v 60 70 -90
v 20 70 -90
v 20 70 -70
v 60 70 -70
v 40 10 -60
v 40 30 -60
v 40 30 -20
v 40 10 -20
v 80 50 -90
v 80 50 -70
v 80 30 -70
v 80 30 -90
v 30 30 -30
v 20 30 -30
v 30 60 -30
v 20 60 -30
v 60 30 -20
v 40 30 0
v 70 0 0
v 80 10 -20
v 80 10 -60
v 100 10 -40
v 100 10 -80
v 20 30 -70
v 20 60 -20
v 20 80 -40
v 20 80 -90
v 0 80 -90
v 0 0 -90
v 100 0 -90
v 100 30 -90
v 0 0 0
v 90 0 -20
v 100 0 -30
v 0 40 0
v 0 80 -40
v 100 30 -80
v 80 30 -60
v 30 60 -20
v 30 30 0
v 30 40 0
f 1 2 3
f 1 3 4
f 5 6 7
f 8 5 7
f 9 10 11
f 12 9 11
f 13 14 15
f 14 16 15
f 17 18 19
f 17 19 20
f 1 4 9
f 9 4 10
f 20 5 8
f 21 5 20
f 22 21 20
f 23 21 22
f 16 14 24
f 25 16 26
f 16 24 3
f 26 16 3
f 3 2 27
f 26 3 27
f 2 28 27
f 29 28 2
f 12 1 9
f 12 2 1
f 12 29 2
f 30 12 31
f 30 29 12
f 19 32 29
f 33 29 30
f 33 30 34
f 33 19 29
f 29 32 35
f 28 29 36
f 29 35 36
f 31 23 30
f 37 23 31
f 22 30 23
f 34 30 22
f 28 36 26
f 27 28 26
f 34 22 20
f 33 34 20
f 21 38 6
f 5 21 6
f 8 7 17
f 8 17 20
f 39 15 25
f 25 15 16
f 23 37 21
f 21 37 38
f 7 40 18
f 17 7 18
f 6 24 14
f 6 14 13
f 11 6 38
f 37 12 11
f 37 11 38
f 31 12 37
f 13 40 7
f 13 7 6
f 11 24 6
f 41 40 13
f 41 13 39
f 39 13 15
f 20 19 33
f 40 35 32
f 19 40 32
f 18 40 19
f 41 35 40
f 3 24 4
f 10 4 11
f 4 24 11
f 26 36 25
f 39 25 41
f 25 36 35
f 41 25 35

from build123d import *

# Parameters (mm, degrees)
SKETCH3_W           = 100
SKETCH3_H           = 80
BOSS_EXTRUDE1_DEPTH = 90
CUT_EXTRUDE1_DEPTH  = 90
CUT_EXTRUDE2_DEPTH  = 90
CUT_EXTRUDE3_DEPTH  = 90
SKETCH8_W           = 40
SKETCH8_H           = 60
CUT_EXTRUDE4_DEPTH  = 60
SKETCH9_W           = 30
SKETCH9_H           = 30
CUT_EXTRUDE5_DEPTH  = 60
SKETCH10_W          = 10
SKETCH10_H          = 10
CUT_EXTRUDE6_DEPTH  = 60
SKETCH11_W          = 40
SKETCH11_H          = 60
BOSS_EXTRUDE2_DEPTH = 20
SKETCH12_W          = 40
SKETCH12_H          = 20
BOSS_EXTRUDE3_DEPTH = 40
SKETCH13_W          = 30
SKETCH13_H          = 10
CUT_EXTRUDE7_DEPTH  = 40
CUT_EXTRUDE8_DEPTH  = 40
CUT_EXTRUDE9_DEPTH  = 20
SKETCH17_W          = 20
SKETCH17_H          = 20
CUT_EXTRUDE10_DEPTH = 84
CUT_EXTRUDE12_DEPTH = 20
CUT_EXTRUDE15_DEPTH = 10
CUT_EXTRUDE17_DEPTH = 77
CUT_EXTRUDE19_DEPTH = 77
CUT_EXTRUDE20_DEPTH = 77
CUT_EXTRUDE21_DEPTH = 77


with BuildPart() as part:
    # Sketch3 → Boss-Extrude1 (new body)
    with BuildSketch(Plane.XY):
        with Locations((50, 40)):
            Rectangle(SKETCH3_W, SKETCH3_H)
    extrude(amount=-BOSS_EXTRUDE1_DEPTH)

    # Sketch4 → Cut-Extrude1 (cut)
    with BuildSketch(Plane.XY):
        Polygon((20, 80), (20, 70), (60, 70), (80, 50), (80, 30), (100, 30), (100, 80), align=None)
    extrude(amount=-CUT_EXTRUDE1_DEPTH, mode=Mode.SUBTRACT)

    # Sketch5 → Cut-Extrude2 (cut)
    with BuildSketch(Plane(origin=(0, 0, 0), x_dir=(-1, 0, 0), z_dir=(0, -1, 0))):
        Polygon((-70, 0), (-100, 30), (-100, 0), align=None)
    extrude(amount=-CUT_EXTRUDE2_DEPTH, mode=Mode.SUBTRACT)

    # Sketch7 → Cut-Extrude3 (cut)
    with BuildSketch(Plane.ZY):
        Polygon((-40, 80), (0, 40), (0, 80), align=None)
    extrude(amount=-CUT_EXTRUDE3_DEPTH, mode=Mode.SUBTRACT)

    # Sketch8 → Cut-Extrude4 (cut)
    with BuildSketch(Plane(origin=(0, 70, 0), x_dir=(1, 0, 0), z_dir=(0, 1, 0))):
        with Locations((40, 60)):
            Rectangle(SKETCH8_W, SKETCH8_H)
    extrude(amount=-CUT_EXTRUDE4_DEPTH, mode=Mode.SUBTRACT)

    # Sketch9 → Cut-Extrude5 (cut)
    with BuildSketch(Plane(origin=(0, 0, -30), x_dir=(-1, 0, 0), z_dir=(0, 0, -1))):
        with Locations((-45, 55)):
            Rectangle(SKETCH9_W, SKETCH9_H)
    extrude(amount=-CUT_EXTRUDE5_DEPTH, mode=Mode.SUBTRACT)

    # Sketch10 → Cut-Extrude6 (cut)
    with BuildSketch(Plane(origin=(0, 0, -30), x_dir=(-1, 0, 0), z_dir=(0, 0, -1))):
        with Locations((-25, 65)):
            Rectangle(SKETCH10_W, SKETCH10_H)
    extrude(amount=-CUT_EXTRUDE6_DEPTH, mode=Mode.SUBTRACT)

    # Sketch11 → Boss-Extrude2 (add)
    with BuildSketch(Plane(origin=(0, 10, 0), x_dir=(1, 0, 0), z_dir=(0, 1, 0))):
        with Locations((40, 60)):
            Rectangle(SKETCH11_W, SKETCH11_H)
    extrude(amount=BOSS_EXTRUDE2_DEPTH)

    # Sketch12 → Boss-Extrude3 (add)
    with BuildSketch(Plane(origin=(0, 30, 0), x_dir=(1, 0, 0), z_dir=(0, 1, 0))):
        with Locations((40, 80)):
            Rectangle(SKETCH12_W, SKETCH12_H)
    extrude(amount=BOSS_EXTRUDE3_DEPTH)

    # Sketch13 → Cut-Extrude7 (cut)
    with BuildSketch(Plane(origin=(0, 0, -30), x_dir=(-1, 0, 0), z_dir=(0, 0, -1))):
        with Locations((-45, 35)):
            Rectangle(SKETCH13_W, SKETCH13_H)
    extrude(amount=-CUT_EXTRUDE7_DEPTH, mode=Mode.SUBTRACT)

    # Sketch15 → Cut-Extrude8 (cut)
    with BuildSketch(Plane.ZY.offset(-60)):
        Polygon((-70, 70), (-70, 30), (0, 30), (0, 40), (-30, 70), align=None)
    extrude(amount=-CUT_EXTRUDE8_DEPTH, mode=Mode.SUBTRACT)

    # Sketch16 → Cut-Extrude9 (cut)
    with BuildSketch(Plane(origin=(0, 30, 0), x_dir=(1, 0, 0), z_dir=(0, 1, 0))):
        Polygon((100, 80), (80, 60), (40, 60), (40, 20), (80, 20), (100, 40), align=None)
    extrude(amount=-CUT_EXTRUDE9_DEPTH, mode=Mode.SUBTRACT)

    # Sketch17 → Cut-Extrude10 (cut)
    with BuildSketch(Plane.XY.offset(-50)):
        with Locations((90, 20)):
            Rectangle(SKETCH17_W, SKETCH17_H)
    extrude(amount=CUT_EXTRUDE10_DEPTH, mode=Mode.SUBTRACT)

    # Sketch19 → Cut-Extrude12 (cut)
    with BuildSketch(Plane.XY.offset(-10)):
        Polygon((80, 10), (60, 30), (80, 30), align=None)
    extrude(amount=CUT_EXTRUDE12_DEPTH, mode=Mode.SUBTRACT)

    # Sketch22 → Cut-Extrude15 (cut)
    with BuildSketch(Plane.XY.offset(-10)):
        Polygon((60, 30), (80, 30), (80, 10), align=None)
    extrude(amount=-CUT_EXTRUDE15_DEPTH, mode=Mode.SUBTRACT)

    # Sketch24 → Cut-Extrude17 (cut)
    with BuildSketch(Plane(origin=(23.333333333, 23.333333333, 23.333333333), x_dir=(0.40824829, 0.40824829, -0.816496581), z_dir=(0.577350269, 0.577350269, 0.577350269))):
        Polygon((53.07227776, -21.213203436), (28.577380332, -7.071067812), (28.577380332, -49.497474683), (53.07227776, -49.497474683), align=None)
    extrude(amount=CUT_EXTRUDE17_DEPTH, mode=Mode.SUBTRACT)

    # Sketch26 → Cut-Extrude19 (cut)
    with BuildSketch(Plane(origin=(35, -35, 0), x_dir=(0, 0, 1), z_dir=(-0.707106781, 0.707106781, 0))):
        Polygon((-20, 63.639610307), (-10, 63.639610307), (0, 49.497474683), align=None)
    extrude(amount=-CUT_EXTRUDE19_DEPTH, mode=Mode.SUBTRACT)

    # Sketch27 → Cut-Extrude20 (cut)
    with BuildSketch(Plane(origin=(45, 45, 0), x_dir=(0, 0, 1), z_dir=(-0.707106781, -0.707106781, 0))):
        Polygon((-20, -49.497474683), (-10, -49.497474683), (-20, -63.639610307), align=None)
    extrude(amount=-CUT_EXTRUDE20_DEPTH, mode=Mode.SUBTRACT)

    # Sketch30 → Cut-Extrude21 (cut)
    with BuildSketch(Plane(origin=(23.333333333, 23.333333333, 23.333333333), x_dir=(-0.816496581, 0.40824829, 0.40824829), z_dir=(-0.577350269, -0.577350269, -0.577350269))):
        Polygon((-69.402209379, 21.213203436), (-93.897106807, 35.355339059), (-93.897106807, 21.213203436), (-81.649658093, 14.142135624), align=None)
    extrude(amount=-CUT_EXTRUDE21_DEPTH, mode=Mode.SUBTRACT)


solid = part.part
